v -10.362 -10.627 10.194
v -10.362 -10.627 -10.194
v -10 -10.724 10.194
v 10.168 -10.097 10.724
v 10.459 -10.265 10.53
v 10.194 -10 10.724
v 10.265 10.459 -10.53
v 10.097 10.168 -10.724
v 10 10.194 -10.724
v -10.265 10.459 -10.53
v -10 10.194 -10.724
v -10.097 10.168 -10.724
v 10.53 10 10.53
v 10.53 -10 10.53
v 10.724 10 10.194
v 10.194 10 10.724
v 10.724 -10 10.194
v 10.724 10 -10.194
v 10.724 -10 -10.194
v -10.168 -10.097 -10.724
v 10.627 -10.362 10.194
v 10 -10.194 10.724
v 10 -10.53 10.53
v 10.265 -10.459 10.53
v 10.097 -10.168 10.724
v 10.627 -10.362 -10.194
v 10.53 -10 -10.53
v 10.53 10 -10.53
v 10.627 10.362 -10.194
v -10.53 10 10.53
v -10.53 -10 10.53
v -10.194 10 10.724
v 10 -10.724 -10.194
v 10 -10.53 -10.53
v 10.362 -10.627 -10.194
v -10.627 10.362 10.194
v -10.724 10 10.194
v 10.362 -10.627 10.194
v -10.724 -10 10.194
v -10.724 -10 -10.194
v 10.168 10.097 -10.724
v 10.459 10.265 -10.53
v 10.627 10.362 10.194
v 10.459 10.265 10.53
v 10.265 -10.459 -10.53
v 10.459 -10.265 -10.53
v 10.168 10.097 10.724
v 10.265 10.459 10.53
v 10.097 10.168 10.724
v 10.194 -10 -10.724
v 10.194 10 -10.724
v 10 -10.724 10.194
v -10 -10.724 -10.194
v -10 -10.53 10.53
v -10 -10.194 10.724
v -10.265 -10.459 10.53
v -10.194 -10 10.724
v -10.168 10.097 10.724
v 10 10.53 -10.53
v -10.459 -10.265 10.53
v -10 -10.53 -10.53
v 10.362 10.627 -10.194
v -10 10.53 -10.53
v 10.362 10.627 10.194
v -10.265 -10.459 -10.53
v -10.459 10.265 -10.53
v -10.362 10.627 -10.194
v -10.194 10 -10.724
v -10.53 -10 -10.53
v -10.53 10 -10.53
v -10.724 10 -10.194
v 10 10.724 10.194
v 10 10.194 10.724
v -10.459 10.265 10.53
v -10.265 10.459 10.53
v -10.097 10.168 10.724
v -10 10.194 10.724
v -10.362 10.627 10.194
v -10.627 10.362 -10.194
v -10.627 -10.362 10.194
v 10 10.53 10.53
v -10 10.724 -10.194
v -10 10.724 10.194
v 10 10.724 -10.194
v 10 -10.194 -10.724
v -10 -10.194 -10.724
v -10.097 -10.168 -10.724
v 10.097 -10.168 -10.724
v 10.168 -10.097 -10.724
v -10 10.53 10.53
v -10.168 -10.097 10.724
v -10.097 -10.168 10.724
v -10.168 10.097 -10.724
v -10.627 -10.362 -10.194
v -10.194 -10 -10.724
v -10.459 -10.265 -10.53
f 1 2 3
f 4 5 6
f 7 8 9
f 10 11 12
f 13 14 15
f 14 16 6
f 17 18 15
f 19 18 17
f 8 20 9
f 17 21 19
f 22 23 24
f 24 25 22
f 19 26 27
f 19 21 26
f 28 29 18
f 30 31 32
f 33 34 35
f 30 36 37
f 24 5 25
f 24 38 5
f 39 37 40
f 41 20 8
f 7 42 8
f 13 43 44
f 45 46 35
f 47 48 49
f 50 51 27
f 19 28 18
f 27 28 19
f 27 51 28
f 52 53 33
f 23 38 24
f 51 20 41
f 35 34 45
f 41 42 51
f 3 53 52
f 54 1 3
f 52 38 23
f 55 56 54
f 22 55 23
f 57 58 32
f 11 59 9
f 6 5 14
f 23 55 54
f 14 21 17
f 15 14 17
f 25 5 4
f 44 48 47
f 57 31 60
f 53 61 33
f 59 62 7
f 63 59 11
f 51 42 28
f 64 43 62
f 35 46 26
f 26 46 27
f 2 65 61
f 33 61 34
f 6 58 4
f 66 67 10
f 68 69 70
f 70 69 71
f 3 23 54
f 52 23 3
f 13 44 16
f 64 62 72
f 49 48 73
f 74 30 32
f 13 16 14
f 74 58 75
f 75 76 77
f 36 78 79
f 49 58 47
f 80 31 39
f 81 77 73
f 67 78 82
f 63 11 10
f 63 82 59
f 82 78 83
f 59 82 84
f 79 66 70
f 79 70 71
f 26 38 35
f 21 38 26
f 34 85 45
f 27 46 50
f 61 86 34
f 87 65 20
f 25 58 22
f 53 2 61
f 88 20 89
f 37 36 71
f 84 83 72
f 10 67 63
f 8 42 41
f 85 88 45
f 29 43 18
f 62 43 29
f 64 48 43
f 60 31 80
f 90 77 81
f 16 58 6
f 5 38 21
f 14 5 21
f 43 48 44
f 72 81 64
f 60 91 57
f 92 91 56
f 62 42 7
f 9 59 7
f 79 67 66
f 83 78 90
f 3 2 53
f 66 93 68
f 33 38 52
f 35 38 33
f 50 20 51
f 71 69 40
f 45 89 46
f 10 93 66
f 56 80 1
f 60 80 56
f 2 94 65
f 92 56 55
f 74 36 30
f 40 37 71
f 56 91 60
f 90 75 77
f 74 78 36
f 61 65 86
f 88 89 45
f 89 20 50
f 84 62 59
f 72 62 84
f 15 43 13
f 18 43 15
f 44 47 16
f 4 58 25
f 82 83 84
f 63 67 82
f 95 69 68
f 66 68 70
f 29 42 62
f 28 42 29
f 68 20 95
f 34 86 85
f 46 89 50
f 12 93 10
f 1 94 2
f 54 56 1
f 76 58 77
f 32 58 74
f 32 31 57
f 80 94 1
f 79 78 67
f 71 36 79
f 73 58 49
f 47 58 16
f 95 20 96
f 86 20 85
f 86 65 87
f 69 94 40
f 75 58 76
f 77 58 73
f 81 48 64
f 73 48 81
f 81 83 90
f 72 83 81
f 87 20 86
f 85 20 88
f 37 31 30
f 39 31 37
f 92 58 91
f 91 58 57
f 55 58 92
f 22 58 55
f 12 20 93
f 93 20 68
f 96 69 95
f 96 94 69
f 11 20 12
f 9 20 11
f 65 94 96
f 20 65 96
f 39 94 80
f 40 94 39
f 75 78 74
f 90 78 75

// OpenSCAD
// file: params_expr.scad
wall = 2;
fillet = wall * 0.75;   // a computed parameter, not a literal
// main file
include <params_expr.scad>
minkowski() {
    cube([20, 20, 20], center = true);
    sphere(r = fillet / 2, $fn = 12);
}
